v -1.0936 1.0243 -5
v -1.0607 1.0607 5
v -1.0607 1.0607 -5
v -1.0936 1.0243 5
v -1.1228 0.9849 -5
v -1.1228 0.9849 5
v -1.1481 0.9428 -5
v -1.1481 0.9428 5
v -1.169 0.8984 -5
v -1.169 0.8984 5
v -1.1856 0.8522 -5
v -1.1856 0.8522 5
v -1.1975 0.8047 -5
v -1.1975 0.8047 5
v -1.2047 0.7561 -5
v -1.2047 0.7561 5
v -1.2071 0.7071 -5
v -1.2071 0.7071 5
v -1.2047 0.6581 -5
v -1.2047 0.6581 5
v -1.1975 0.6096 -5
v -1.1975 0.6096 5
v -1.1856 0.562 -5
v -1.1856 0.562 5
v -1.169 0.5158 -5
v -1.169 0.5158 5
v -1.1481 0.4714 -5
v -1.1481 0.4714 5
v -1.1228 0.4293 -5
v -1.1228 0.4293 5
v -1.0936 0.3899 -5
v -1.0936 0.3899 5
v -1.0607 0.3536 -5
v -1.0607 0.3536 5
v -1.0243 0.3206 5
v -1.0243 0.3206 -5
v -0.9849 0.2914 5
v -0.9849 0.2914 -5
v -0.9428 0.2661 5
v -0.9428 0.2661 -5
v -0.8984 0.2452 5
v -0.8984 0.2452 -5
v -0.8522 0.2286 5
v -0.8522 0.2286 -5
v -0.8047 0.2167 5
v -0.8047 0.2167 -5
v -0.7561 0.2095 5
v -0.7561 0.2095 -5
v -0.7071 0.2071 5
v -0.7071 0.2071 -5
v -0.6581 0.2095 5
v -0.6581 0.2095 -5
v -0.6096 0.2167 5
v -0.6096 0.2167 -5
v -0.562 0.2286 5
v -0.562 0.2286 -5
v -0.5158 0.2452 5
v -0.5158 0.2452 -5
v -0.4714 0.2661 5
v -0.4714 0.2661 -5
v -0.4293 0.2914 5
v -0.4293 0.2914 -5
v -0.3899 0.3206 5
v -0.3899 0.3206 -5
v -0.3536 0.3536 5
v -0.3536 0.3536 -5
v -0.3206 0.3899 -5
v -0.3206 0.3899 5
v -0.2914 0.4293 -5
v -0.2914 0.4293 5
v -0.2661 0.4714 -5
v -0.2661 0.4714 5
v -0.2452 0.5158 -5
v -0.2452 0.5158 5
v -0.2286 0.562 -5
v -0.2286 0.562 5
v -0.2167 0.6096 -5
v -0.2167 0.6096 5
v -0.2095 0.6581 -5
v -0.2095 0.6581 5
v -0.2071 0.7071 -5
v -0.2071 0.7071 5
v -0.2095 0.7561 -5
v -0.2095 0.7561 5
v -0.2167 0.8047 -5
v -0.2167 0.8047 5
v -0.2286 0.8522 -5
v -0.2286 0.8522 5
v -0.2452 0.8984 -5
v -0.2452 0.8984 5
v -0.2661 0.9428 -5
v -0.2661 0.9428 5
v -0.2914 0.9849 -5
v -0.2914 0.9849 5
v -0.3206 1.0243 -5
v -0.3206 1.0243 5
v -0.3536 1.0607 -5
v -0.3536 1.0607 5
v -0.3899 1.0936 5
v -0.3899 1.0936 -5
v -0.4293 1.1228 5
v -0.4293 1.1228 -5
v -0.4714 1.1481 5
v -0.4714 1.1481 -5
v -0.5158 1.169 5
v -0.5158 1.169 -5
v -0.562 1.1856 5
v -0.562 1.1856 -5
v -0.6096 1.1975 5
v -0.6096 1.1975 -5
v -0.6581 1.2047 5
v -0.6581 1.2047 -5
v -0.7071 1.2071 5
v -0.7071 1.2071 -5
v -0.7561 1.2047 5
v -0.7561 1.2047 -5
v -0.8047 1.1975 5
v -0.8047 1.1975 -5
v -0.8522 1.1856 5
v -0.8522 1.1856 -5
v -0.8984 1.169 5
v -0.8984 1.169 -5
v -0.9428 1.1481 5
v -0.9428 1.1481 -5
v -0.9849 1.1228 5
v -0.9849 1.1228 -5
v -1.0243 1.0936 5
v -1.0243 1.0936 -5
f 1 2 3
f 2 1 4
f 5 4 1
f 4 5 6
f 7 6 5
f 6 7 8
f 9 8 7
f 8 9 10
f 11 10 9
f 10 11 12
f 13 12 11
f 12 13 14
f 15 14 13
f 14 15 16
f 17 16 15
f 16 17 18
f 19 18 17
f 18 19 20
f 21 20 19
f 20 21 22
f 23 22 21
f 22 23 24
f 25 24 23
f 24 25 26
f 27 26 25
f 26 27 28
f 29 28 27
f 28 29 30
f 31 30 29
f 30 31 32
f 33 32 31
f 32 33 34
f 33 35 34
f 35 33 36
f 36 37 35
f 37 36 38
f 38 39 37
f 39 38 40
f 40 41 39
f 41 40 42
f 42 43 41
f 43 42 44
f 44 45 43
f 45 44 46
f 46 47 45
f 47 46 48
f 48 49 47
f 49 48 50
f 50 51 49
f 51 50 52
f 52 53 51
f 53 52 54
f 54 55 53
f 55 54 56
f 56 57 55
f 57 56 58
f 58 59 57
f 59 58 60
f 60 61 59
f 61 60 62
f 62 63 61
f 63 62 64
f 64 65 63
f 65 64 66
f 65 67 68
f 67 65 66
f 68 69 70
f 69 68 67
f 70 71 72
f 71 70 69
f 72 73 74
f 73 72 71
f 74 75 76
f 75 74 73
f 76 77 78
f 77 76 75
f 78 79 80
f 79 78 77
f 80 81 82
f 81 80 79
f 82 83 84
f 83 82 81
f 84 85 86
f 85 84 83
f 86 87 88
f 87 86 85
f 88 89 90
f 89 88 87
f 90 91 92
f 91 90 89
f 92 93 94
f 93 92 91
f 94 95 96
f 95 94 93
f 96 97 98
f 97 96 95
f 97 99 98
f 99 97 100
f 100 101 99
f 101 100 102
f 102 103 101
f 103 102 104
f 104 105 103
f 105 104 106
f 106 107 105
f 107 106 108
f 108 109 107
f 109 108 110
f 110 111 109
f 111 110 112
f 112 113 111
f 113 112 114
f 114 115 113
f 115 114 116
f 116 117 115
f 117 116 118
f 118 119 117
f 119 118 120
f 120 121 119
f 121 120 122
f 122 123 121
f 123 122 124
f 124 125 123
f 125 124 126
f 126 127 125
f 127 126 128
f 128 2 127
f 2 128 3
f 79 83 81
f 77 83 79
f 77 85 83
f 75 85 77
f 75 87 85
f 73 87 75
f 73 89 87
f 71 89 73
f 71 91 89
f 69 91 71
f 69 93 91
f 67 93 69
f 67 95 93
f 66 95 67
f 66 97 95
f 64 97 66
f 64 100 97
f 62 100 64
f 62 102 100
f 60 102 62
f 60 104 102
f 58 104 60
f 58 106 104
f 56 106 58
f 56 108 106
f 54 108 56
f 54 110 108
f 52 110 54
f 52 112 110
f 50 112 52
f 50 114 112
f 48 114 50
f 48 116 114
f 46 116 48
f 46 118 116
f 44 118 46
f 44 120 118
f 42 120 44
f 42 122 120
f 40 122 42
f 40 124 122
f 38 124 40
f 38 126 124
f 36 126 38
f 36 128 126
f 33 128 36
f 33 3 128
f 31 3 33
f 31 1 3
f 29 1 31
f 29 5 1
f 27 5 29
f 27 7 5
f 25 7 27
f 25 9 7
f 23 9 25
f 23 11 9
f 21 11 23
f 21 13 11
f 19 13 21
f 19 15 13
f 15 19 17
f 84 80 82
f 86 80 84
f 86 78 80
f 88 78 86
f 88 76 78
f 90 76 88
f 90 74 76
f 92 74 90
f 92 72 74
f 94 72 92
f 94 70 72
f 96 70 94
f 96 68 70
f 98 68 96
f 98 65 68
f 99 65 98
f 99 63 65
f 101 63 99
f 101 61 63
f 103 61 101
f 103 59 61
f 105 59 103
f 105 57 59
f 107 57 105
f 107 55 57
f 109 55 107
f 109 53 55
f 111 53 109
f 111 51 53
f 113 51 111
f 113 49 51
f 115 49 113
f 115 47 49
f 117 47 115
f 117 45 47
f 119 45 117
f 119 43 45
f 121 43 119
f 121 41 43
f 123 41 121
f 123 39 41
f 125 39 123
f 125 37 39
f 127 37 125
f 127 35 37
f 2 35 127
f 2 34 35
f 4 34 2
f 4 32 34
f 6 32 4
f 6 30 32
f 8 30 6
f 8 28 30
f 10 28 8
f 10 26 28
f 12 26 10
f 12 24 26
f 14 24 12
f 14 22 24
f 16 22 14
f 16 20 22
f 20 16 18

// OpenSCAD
$fn = 64;

electrode_number = 1;
n = electrode_number;

param1 = 10;
L = param1;

param2 = 1;
r = param2;

param3 = 1;
d = param3;

//for (angle = [45:90:315]){
angle = 45 + 90*n;
rotate([0,0,angle])translate([r,0,0])cylinder(h = L, r = d/2,center = true);
